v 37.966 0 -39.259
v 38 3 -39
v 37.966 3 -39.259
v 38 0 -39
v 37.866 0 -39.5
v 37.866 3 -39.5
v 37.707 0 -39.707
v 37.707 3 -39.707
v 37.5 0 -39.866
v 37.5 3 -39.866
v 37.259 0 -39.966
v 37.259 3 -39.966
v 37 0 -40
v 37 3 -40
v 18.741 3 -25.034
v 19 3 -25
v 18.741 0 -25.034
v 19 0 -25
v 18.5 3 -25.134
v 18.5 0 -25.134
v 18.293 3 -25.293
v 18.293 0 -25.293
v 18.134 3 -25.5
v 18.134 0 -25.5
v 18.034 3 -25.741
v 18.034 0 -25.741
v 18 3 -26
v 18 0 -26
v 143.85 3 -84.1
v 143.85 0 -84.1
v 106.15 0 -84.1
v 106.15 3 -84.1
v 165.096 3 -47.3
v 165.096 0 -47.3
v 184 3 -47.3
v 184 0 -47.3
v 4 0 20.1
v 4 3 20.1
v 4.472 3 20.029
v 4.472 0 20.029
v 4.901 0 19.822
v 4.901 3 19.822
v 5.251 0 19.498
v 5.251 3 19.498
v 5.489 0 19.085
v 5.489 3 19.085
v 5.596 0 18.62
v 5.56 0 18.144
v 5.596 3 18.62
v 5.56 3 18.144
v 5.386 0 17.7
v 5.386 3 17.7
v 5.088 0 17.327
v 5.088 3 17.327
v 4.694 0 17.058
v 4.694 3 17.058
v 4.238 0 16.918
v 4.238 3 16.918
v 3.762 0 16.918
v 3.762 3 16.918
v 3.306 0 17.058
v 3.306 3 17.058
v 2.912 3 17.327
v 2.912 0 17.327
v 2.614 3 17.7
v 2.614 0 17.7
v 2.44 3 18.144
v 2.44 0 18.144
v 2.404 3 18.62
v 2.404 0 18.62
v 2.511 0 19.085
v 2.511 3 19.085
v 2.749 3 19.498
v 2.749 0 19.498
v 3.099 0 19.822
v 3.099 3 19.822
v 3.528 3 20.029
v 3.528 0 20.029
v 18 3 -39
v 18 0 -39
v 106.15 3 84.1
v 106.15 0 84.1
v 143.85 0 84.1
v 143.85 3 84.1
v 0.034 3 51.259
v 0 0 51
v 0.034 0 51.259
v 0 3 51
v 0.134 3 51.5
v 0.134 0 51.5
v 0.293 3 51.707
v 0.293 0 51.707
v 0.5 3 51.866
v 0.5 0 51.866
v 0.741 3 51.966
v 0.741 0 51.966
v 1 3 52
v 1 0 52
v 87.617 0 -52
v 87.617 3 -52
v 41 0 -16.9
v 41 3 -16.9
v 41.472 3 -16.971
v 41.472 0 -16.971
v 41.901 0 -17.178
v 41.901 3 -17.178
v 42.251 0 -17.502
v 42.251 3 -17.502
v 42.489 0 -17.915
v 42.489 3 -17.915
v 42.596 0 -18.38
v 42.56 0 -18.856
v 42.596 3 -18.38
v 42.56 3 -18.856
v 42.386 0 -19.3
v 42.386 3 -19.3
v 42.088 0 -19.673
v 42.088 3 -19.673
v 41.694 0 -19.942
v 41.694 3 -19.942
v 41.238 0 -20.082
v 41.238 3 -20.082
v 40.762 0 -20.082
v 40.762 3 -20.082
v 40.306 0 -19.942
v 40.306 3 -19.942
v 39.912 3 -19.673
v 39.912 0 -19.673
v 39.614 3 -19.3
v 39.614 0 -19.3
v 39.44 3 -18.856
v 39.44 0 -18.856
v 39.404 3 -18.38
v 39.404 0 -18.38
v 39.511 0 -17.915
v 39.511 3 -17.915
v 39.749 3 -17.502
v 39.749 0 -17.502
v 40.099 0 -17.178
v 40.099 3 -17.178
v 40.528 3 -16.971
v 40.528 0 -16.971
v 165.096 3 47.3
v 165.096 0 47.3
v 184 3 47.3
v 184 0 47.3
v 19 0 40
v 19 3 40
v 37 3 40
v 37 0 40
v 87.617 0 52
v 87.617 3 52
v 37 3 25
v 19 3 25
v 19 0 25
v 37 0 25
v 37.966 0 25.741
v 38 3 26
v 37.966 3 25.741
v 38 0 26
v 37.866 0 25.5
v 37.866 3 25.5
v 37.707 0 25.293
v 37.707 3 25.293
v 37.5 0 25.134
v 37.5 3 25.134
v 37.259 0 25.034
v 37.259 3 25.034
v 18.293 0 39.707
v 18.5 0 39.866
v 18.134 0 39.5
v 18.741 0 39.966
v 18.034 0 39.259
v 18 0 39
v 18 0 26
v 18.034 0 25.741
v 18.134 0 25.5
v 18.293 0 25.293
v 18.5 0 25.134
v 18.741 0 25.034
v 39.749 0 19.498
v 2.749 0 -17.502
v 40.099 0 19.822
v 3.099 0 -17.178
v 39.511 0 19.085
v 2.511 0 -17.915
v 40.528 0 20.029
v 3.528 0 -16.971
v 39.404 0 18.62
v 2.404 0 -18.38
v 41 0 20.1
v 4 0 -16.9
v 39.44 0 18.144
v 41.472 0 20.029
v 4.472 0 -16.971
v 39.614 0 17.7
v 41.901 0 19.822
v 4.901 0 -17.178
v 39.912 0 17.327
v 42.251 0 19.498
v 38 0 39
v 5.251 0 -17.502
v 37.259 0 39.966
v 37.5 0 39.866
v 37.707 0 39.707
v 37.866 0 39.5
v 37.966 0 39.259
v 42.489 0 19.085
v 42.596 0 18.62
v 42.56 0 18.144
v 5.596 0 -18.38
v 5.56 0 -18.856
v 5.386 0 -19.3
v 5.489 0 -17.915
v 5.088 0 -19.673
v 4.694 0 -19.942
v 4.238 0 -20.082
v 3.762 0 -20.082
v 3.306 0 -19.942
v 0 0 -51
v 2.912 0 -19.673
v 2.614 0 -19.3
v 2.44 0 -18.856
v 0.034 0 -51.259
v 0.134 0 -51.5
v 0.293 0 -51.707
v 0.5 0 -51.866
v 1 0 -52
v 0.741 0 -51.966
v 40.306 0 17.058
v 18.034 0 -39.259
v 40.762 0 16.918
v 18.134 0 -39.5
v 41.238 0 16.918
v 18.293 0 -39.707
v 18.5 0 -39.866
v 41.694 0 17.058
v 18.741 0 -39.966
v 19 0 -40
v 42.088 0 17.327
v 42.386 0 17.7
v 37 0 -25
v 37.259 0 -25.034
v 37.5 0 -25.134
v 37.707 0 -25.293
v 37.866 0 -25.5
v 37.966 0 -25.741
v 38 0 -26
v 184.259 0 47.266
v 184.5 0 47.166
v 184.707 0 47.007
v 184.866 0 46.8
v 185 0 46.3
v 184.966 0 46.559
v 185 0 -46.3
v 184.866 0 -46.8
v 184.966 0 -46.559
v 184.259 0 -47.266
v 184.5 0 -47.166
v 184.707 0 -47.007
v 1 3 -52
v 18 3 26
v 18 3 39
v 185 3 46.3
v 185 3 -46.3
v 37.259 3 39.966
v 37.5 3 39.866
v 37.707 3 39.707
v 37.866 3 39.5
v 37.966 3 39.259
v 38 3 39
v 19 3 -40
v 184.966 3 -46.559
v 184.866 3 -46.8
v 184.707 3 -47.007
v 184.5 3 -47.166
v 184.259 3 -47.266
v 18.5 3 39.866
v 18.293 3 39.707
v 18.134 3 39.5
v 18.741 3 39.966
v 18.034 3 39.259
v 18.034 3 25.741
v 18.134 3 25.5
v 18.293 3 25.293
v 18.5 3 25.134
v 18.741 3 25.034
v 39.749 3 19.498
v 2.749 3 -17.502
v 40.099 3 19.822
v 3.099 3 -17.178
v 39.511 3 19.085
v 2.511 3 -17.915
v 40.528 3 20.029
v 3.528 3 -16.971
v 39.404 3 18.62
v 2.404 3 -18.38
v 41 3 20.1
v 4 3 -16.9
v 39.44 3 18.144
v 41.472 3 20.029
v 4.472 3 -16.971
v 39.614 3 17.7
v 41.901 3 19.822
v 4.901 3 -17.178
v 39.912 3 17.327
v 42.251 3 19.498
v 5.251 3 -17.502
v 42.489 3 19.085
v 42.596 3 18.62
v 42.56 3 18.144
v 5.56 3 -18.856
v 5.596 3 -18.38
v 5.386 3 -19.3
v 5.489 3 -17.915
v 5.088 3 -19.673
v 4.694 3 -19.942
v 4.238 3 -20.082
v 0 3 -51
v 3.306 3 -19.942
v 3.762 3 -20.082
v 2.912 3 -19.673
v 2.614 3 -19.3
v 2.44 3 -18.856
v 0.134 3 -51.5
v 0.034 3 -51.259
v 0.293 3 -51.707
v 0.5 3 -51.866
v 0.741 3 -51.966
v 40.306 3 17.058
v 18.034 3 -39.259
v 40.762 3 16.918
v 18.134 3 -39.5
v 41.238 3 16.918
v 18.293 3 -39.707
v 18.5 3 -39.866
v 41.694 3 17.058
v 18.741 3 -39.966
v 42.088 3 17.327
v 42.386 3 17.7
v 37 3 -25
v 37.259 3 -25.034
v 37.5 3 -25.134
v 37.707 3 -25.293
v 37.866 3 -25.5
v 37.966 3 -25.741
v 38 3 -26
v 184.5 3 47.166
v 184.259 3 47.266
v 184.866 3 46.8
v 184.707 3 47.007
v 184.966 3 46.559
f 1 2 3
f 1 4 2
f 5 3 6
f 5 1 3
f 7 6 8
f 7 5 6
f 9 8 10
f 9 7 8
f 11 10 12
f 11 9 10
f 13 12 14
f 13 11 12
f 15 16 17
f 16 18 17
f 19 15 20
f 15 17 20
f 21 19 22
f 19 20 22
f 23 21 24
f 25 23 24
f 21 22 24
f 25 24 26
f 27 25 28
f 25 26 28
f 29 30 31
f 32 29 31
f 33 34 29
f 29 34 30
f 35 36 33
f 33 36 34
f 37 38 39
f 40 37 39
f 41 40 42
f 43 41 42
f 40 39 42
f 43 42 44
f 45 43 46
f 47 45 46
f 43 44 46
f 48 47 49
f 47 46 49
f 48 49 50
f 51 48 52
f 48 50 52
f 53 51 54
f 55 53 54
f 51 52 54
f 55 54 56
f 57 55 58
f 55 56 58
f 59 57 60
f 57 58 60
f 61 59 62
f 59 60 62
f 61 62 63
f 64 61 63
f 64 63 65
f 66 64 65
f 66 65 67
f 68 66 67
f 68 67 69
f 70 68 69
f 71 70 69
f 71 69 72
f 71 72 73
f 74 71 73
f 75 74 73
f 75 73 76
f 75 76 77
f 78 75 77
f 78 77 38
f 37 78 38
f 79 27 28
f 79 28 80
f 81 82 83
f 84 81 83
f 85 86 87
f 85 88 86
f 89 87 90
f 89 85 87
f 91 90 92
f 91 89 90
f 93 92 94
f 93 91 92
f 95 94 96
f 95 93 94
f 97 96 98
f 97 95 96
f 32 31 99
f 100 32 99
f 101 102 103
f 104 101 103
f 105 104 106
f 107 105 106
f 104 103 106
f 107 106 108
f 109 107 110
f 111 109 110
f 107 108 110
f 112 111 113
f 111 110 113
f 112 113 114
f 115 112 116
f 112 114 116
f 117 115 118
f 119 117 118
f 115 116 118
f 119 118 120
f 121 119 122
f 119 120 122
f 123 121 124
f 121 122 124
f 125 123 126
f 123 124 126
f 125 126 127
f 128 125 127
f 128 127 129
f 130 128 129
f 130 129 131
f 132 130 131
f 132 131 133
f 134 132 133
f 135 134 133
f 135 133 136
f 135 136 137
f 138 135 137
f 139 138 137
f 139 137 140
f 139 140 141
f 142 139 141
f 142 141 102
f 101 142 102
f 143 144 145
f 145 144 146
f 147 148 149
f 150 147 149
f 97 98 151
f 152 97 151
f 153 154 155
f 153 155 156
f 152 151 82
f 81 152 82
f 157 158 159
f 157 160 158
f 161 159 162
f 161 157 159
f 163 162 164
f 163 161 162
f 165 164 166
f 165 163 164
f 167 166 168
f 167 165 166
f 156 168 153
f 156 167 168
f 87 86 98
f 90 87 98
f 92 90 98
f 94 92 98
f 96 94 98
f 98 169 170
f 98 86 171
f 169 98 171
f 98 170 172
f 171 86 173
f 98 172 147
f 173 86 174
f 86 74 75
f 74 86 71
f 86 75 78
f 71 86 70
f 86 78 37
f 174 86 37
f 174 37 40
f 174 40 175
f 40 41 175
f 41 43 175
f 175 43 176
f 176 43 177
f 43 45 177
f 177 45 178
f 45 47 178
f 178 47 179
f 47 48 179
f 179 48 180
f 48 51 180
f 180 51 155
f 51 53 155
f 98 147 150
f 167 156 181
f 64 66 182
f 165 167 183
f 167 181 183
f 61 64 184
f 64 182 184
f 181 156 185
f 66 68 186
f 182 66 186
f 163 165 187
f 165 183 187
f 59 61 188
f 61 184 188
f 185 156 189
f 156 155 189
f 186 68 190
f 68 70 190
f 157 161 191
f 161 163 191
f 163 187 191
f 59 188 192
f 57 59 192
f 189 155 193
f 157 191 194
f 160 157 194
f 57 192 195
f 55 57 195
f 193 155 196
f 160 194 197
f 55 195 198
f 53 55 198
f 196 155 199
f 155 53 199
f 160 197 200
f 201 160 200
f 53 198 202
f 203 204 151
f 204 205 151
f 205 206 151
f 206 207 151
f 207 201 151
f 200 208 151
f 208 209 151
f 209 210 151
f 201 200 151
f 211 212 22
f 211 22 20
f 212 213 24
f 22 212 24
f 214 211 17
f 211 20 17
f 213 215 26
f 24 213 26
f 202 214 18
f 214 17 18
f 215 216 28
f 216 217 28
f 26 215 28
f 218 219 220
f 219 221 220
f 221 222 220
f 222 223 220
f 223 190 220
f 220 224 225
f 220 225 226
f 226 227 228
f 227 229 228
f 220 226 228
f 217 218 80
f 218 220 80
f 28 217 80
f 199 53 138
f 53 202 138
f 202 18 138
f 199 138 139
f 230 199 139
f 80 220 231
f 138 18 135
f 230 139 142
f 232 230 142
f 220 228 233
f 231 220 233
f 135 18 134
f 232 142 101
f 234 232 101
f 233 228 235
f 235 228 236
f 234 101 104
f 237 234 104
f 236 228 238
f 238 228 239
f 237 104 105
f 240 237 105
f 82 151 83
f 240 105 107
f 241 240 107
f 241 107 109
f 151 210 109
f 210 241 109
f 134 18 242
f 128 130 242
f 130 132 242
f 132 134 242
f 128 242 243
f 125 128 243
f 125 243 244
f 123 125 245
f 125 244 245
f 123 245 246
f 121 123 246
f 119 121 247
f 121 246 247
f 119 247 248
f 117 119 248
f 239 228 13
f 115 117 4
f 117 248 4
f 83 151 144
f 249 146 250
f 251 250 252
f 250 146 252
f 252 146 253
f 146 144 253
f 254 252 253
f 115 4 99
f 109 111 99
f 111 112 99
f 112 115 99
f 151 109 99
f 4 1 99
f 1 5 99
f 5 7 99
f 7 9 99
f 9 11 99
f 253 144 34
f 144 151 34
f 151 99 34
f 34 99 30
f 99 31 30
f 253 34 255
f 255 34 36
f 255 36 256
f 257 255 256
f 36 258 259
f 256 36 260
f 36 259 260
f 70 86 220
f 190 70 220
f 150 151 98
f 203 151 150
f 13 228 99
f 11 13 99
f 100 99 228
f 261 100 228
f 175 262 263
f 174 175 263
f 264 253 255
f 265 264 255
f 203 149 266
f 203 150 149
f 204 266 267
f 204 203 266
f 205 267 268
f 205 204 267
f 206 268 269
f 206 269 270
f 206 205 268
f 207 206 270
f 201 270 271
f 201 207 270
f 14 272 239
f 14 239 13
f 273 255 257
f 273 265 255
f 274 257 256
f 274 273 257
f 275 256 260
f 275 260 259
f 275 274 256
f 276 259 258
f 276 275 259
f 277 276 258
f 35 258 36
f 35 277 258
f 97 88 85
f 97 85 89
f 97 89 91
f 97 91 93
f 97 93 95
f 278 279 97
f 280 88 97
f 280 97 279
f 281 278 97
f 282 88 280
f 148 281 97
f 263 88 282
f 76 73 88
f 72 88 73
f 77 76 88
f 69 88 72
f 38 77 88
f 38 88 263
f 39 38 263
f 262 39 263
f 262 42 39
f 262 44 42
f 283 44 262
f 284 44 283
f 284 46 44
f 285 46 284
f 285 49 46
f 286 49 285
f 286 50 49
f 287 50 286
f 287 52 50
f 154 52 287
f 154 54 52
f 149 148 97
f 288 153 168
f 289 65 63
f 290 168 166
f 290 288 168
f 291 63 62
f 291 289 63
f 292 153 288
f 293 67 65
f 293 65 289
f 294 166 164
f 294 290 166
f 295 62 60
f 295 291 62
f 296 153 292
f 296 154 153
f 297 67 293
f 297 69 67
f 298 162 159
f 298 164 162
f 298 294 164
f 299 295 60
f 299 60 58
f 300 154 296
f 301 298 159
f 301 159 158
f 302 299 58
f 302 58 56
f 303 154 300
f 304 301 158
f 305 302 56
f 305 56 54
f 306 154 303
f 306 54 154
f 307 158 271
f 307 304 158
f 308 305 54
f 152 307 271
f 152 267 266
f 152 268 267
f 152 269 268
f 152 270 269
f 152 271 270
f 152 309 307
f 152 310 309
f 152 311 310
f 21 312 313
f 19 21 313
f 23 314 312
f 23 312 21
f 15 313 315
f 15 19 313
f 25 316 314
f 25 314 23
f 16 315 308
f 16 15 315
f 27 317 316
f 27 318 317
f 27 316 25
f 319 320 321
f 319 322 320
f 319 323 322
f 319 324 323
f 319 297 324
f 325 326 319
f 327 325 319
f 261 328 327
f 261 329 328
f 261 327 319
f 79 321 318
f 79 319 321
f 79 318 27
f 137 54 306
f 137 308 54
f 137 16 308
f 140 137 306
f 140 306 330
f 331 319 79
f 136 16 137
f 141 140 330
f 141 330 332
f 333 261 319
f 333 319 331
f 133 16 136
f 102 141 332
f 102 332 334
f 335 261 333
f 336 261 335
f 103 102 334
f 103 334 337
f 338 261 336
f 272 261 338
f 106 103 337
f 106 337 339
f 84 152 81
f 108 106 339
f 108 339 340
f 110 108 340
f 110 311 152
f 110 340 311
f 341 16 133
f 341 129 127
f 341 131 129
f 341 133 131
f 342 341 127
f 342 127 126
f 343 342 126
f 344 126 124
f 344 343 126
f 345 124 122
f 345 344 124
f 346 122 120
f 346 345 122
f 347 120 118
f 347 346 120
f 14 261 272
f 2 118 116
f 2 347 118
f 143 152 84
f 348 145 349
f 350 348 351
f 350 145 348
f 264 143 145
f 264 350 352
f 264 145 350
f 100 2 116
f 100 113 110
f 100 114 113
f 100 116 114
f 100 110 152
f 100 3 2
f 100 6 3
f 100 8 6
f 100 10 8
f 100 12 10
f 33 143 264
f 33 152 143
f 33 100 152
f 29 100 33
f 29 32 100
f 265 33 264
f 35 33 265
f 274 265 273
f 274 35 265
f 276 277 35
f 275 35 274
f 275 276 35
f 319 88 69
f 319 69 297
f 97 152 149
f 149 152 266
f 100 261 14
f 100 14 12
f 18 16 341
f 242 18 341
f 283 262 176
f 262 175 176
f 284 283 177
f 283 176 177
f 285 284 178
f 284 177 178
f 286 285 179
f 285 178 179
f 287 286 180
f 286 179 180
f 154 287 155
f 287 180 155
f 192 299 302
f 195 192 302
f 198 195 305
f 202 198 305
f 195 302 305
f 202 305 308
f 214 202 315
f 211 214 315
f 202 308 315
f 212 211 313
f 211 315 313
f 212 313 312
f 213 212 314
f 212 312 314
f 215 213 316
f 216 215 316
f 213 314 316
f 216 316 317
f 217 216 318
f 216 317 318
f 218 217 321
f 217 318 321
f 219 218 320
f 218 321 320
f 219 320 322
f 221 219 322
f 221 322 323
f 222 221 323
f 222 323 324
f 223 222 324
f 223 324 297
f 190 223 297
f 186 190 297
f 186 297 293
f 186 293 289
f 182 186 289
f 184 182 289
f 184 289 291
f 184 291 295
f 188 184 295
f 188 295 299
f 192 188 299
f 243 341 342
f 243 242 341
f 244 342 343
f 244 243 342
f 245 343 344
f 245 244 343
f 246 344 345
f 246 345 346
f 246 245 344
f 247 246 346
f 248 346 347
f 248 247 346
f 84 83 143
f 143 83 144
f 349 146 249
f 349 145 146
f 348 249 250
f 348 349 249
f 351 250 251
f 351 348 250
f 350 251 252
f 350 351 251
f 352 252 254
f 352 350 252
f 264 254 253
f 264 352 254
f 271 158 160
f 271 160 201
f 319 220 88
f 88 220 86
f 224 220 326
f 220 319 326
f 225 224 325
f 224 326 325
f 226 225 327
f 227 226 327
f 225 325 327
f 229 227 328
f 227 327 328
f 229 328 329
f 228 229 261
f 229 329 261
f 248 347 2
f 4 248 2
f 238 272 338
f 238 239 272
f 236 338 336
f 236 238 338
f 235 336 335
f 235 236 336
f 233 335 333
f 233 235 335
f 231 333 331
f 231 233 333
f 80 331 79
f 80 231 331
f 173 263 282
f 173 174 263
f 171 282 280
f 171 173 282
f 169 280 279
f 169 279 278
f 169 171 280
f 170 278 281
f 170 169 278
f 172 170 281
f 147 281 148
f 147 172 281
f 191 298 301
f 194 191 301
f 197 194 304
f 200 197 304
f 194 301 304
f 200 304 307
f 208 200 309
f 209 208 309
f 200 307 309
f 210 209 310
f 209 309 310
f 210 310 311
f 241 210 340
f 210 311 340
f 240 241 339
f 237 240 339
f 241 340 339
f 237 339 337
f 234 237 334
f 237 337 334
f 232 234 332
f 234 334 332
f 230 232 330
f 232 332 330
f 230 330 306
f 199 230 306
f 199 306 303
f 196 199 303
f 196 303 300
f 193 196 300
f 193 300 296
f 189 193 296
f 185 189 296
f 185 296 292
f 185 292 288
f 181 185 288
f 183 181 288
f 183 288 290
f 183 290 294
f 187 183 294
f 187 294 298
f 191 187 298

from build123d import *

# Parameters (mm, degrees)
BOSS_EXTRUDE1_DEPTH                        = 3
FILLET1_R                                  = 1
SKETCH2_R                                  = 1.6
MOTOR_DRIVER_HOLES_DEPTH                   = 204.240768548
SKETCH3_W                                  = 20
SKETCH3_H                                  = 15
MOTOR_DRIVER_ROUTING_POCKET_DEPTH          = 204.240768548
MOTOR_DRIVER_ROUTING_POCKET_FILLETS_R      = 1
MOTOR_DRIVER_ROUTING_POCKET_FILLETS_OF_M_R = 1


with BuildPart() as part:
    # Sketch1 → Boss-Extrude1 (new body)
    with BuildSketch(Plane(origin=(0, 0, 0), x_dir=(1, 0, 0), z_dir=(0, 1, 0))):
        Polygon((0, 52), (0, -52), (87.617056359, -52), (106.15, -84.1), (143.85, -84.1), (165.096489906, -47.3), (185, -47.3), (185, 47.3), (165.096489906, 47.3), (143.85, 84.1), (106.15, 84.1), (87.617056359, 52), align=None)
    extrude(amount=BOSS_EXTRUDE1_DEPTH)

    # Fillet1
    fillet1_edges = [part.edges().sort_by_distance(p)[0] for p in [
        (185, 1.5, -47.3),
        (185, 1.5, 47.3),
        (0, 1.5, 52),
        (0, 1.5, -52),
    ]]
    fillet(fillet1_edges, radius=FILLET1_R)

    # Sketch2 → Motor Driver Holes (cut, through all)
    with BuildSketch(Plane(origin=(0, 3, 0), x_dir=(1, 0, 0), z_dir=(0, 1, 0))):
        with Locations(Location((4, 18.5, 0), (0, 0, 270))):
            Circle(SKETCH2_R)
        with Locations(Location((41, 18.5, 0), (0, 0, 270))):
            Circle(SKETCH2_R)
        with Locations(Location((4, -18.5, 0), (0, 0, 270))):
            Circle(SKETCH2_R)
        with Locations(Location((41, -18.5, 0), (0, 0, 270))):
            Circle(SKETCH2_R)
    extrude(amount=-MOTOR_DRIVER_HOLES_DEPTH, mode=Mode.SUBTRACT)

    # Sketch3 → Motor Driver Routing Pocket (cut, through all)
    with BuildSketch(Plane(origin=(0, 3, 0), x_dir=(1, 0, 0), z_dir=(0, 1, 0))):
        with Locations((28, 32.5)):
            Rectangle(SKETCH3_W, SKETCH3_H)
    motor_driver_routing_pocket = extrude(amount=-MOTOR_DRIVER_ROUTING_POCKET_DEPTH, mode=Mode.SUBTRACT)

    # Motor Driver Routing Pocket Fillets
    motor_driver_routing_pocket_fillets_edges = [part.edges().sort_by_distance(p)[0] for p in [
        (38, 1.5, -40),
        (38, 1.5, -25),
        (18, 1.5, -25),
        (18, 1.5, -40),
    ]]
    fillet(motor_driver_routing_pocket_fillets_edges, radius=MOTOR_DRIVER_ROUTING_POCKET_FILLETS_R)

    # Mirror1: Motor Driver Routing Pocket across plane
    add(motor_driver_routing_pocket.mirror(Plane.XY), mode=Mode.SUBTRACT)

    # Motor Driver Routing Pocket Fillets of M
    motor_driver_routing_pocket_fillets_of_m_edges = [part.edges().sort_by_distance(p)[0] for p in [
        (38, 1.5, 40),
        (38, 1.5, 25),
        (18, 1.5, 25),
        (18, 1.5, 40),
    ]]
    fillet(motor_driver_routing_pocket_fillets_of_m_edges, radius=MOTOR_DRIVER_ROUTING_POCKET_FILLETS_OF_M_R)


solid = part.part
